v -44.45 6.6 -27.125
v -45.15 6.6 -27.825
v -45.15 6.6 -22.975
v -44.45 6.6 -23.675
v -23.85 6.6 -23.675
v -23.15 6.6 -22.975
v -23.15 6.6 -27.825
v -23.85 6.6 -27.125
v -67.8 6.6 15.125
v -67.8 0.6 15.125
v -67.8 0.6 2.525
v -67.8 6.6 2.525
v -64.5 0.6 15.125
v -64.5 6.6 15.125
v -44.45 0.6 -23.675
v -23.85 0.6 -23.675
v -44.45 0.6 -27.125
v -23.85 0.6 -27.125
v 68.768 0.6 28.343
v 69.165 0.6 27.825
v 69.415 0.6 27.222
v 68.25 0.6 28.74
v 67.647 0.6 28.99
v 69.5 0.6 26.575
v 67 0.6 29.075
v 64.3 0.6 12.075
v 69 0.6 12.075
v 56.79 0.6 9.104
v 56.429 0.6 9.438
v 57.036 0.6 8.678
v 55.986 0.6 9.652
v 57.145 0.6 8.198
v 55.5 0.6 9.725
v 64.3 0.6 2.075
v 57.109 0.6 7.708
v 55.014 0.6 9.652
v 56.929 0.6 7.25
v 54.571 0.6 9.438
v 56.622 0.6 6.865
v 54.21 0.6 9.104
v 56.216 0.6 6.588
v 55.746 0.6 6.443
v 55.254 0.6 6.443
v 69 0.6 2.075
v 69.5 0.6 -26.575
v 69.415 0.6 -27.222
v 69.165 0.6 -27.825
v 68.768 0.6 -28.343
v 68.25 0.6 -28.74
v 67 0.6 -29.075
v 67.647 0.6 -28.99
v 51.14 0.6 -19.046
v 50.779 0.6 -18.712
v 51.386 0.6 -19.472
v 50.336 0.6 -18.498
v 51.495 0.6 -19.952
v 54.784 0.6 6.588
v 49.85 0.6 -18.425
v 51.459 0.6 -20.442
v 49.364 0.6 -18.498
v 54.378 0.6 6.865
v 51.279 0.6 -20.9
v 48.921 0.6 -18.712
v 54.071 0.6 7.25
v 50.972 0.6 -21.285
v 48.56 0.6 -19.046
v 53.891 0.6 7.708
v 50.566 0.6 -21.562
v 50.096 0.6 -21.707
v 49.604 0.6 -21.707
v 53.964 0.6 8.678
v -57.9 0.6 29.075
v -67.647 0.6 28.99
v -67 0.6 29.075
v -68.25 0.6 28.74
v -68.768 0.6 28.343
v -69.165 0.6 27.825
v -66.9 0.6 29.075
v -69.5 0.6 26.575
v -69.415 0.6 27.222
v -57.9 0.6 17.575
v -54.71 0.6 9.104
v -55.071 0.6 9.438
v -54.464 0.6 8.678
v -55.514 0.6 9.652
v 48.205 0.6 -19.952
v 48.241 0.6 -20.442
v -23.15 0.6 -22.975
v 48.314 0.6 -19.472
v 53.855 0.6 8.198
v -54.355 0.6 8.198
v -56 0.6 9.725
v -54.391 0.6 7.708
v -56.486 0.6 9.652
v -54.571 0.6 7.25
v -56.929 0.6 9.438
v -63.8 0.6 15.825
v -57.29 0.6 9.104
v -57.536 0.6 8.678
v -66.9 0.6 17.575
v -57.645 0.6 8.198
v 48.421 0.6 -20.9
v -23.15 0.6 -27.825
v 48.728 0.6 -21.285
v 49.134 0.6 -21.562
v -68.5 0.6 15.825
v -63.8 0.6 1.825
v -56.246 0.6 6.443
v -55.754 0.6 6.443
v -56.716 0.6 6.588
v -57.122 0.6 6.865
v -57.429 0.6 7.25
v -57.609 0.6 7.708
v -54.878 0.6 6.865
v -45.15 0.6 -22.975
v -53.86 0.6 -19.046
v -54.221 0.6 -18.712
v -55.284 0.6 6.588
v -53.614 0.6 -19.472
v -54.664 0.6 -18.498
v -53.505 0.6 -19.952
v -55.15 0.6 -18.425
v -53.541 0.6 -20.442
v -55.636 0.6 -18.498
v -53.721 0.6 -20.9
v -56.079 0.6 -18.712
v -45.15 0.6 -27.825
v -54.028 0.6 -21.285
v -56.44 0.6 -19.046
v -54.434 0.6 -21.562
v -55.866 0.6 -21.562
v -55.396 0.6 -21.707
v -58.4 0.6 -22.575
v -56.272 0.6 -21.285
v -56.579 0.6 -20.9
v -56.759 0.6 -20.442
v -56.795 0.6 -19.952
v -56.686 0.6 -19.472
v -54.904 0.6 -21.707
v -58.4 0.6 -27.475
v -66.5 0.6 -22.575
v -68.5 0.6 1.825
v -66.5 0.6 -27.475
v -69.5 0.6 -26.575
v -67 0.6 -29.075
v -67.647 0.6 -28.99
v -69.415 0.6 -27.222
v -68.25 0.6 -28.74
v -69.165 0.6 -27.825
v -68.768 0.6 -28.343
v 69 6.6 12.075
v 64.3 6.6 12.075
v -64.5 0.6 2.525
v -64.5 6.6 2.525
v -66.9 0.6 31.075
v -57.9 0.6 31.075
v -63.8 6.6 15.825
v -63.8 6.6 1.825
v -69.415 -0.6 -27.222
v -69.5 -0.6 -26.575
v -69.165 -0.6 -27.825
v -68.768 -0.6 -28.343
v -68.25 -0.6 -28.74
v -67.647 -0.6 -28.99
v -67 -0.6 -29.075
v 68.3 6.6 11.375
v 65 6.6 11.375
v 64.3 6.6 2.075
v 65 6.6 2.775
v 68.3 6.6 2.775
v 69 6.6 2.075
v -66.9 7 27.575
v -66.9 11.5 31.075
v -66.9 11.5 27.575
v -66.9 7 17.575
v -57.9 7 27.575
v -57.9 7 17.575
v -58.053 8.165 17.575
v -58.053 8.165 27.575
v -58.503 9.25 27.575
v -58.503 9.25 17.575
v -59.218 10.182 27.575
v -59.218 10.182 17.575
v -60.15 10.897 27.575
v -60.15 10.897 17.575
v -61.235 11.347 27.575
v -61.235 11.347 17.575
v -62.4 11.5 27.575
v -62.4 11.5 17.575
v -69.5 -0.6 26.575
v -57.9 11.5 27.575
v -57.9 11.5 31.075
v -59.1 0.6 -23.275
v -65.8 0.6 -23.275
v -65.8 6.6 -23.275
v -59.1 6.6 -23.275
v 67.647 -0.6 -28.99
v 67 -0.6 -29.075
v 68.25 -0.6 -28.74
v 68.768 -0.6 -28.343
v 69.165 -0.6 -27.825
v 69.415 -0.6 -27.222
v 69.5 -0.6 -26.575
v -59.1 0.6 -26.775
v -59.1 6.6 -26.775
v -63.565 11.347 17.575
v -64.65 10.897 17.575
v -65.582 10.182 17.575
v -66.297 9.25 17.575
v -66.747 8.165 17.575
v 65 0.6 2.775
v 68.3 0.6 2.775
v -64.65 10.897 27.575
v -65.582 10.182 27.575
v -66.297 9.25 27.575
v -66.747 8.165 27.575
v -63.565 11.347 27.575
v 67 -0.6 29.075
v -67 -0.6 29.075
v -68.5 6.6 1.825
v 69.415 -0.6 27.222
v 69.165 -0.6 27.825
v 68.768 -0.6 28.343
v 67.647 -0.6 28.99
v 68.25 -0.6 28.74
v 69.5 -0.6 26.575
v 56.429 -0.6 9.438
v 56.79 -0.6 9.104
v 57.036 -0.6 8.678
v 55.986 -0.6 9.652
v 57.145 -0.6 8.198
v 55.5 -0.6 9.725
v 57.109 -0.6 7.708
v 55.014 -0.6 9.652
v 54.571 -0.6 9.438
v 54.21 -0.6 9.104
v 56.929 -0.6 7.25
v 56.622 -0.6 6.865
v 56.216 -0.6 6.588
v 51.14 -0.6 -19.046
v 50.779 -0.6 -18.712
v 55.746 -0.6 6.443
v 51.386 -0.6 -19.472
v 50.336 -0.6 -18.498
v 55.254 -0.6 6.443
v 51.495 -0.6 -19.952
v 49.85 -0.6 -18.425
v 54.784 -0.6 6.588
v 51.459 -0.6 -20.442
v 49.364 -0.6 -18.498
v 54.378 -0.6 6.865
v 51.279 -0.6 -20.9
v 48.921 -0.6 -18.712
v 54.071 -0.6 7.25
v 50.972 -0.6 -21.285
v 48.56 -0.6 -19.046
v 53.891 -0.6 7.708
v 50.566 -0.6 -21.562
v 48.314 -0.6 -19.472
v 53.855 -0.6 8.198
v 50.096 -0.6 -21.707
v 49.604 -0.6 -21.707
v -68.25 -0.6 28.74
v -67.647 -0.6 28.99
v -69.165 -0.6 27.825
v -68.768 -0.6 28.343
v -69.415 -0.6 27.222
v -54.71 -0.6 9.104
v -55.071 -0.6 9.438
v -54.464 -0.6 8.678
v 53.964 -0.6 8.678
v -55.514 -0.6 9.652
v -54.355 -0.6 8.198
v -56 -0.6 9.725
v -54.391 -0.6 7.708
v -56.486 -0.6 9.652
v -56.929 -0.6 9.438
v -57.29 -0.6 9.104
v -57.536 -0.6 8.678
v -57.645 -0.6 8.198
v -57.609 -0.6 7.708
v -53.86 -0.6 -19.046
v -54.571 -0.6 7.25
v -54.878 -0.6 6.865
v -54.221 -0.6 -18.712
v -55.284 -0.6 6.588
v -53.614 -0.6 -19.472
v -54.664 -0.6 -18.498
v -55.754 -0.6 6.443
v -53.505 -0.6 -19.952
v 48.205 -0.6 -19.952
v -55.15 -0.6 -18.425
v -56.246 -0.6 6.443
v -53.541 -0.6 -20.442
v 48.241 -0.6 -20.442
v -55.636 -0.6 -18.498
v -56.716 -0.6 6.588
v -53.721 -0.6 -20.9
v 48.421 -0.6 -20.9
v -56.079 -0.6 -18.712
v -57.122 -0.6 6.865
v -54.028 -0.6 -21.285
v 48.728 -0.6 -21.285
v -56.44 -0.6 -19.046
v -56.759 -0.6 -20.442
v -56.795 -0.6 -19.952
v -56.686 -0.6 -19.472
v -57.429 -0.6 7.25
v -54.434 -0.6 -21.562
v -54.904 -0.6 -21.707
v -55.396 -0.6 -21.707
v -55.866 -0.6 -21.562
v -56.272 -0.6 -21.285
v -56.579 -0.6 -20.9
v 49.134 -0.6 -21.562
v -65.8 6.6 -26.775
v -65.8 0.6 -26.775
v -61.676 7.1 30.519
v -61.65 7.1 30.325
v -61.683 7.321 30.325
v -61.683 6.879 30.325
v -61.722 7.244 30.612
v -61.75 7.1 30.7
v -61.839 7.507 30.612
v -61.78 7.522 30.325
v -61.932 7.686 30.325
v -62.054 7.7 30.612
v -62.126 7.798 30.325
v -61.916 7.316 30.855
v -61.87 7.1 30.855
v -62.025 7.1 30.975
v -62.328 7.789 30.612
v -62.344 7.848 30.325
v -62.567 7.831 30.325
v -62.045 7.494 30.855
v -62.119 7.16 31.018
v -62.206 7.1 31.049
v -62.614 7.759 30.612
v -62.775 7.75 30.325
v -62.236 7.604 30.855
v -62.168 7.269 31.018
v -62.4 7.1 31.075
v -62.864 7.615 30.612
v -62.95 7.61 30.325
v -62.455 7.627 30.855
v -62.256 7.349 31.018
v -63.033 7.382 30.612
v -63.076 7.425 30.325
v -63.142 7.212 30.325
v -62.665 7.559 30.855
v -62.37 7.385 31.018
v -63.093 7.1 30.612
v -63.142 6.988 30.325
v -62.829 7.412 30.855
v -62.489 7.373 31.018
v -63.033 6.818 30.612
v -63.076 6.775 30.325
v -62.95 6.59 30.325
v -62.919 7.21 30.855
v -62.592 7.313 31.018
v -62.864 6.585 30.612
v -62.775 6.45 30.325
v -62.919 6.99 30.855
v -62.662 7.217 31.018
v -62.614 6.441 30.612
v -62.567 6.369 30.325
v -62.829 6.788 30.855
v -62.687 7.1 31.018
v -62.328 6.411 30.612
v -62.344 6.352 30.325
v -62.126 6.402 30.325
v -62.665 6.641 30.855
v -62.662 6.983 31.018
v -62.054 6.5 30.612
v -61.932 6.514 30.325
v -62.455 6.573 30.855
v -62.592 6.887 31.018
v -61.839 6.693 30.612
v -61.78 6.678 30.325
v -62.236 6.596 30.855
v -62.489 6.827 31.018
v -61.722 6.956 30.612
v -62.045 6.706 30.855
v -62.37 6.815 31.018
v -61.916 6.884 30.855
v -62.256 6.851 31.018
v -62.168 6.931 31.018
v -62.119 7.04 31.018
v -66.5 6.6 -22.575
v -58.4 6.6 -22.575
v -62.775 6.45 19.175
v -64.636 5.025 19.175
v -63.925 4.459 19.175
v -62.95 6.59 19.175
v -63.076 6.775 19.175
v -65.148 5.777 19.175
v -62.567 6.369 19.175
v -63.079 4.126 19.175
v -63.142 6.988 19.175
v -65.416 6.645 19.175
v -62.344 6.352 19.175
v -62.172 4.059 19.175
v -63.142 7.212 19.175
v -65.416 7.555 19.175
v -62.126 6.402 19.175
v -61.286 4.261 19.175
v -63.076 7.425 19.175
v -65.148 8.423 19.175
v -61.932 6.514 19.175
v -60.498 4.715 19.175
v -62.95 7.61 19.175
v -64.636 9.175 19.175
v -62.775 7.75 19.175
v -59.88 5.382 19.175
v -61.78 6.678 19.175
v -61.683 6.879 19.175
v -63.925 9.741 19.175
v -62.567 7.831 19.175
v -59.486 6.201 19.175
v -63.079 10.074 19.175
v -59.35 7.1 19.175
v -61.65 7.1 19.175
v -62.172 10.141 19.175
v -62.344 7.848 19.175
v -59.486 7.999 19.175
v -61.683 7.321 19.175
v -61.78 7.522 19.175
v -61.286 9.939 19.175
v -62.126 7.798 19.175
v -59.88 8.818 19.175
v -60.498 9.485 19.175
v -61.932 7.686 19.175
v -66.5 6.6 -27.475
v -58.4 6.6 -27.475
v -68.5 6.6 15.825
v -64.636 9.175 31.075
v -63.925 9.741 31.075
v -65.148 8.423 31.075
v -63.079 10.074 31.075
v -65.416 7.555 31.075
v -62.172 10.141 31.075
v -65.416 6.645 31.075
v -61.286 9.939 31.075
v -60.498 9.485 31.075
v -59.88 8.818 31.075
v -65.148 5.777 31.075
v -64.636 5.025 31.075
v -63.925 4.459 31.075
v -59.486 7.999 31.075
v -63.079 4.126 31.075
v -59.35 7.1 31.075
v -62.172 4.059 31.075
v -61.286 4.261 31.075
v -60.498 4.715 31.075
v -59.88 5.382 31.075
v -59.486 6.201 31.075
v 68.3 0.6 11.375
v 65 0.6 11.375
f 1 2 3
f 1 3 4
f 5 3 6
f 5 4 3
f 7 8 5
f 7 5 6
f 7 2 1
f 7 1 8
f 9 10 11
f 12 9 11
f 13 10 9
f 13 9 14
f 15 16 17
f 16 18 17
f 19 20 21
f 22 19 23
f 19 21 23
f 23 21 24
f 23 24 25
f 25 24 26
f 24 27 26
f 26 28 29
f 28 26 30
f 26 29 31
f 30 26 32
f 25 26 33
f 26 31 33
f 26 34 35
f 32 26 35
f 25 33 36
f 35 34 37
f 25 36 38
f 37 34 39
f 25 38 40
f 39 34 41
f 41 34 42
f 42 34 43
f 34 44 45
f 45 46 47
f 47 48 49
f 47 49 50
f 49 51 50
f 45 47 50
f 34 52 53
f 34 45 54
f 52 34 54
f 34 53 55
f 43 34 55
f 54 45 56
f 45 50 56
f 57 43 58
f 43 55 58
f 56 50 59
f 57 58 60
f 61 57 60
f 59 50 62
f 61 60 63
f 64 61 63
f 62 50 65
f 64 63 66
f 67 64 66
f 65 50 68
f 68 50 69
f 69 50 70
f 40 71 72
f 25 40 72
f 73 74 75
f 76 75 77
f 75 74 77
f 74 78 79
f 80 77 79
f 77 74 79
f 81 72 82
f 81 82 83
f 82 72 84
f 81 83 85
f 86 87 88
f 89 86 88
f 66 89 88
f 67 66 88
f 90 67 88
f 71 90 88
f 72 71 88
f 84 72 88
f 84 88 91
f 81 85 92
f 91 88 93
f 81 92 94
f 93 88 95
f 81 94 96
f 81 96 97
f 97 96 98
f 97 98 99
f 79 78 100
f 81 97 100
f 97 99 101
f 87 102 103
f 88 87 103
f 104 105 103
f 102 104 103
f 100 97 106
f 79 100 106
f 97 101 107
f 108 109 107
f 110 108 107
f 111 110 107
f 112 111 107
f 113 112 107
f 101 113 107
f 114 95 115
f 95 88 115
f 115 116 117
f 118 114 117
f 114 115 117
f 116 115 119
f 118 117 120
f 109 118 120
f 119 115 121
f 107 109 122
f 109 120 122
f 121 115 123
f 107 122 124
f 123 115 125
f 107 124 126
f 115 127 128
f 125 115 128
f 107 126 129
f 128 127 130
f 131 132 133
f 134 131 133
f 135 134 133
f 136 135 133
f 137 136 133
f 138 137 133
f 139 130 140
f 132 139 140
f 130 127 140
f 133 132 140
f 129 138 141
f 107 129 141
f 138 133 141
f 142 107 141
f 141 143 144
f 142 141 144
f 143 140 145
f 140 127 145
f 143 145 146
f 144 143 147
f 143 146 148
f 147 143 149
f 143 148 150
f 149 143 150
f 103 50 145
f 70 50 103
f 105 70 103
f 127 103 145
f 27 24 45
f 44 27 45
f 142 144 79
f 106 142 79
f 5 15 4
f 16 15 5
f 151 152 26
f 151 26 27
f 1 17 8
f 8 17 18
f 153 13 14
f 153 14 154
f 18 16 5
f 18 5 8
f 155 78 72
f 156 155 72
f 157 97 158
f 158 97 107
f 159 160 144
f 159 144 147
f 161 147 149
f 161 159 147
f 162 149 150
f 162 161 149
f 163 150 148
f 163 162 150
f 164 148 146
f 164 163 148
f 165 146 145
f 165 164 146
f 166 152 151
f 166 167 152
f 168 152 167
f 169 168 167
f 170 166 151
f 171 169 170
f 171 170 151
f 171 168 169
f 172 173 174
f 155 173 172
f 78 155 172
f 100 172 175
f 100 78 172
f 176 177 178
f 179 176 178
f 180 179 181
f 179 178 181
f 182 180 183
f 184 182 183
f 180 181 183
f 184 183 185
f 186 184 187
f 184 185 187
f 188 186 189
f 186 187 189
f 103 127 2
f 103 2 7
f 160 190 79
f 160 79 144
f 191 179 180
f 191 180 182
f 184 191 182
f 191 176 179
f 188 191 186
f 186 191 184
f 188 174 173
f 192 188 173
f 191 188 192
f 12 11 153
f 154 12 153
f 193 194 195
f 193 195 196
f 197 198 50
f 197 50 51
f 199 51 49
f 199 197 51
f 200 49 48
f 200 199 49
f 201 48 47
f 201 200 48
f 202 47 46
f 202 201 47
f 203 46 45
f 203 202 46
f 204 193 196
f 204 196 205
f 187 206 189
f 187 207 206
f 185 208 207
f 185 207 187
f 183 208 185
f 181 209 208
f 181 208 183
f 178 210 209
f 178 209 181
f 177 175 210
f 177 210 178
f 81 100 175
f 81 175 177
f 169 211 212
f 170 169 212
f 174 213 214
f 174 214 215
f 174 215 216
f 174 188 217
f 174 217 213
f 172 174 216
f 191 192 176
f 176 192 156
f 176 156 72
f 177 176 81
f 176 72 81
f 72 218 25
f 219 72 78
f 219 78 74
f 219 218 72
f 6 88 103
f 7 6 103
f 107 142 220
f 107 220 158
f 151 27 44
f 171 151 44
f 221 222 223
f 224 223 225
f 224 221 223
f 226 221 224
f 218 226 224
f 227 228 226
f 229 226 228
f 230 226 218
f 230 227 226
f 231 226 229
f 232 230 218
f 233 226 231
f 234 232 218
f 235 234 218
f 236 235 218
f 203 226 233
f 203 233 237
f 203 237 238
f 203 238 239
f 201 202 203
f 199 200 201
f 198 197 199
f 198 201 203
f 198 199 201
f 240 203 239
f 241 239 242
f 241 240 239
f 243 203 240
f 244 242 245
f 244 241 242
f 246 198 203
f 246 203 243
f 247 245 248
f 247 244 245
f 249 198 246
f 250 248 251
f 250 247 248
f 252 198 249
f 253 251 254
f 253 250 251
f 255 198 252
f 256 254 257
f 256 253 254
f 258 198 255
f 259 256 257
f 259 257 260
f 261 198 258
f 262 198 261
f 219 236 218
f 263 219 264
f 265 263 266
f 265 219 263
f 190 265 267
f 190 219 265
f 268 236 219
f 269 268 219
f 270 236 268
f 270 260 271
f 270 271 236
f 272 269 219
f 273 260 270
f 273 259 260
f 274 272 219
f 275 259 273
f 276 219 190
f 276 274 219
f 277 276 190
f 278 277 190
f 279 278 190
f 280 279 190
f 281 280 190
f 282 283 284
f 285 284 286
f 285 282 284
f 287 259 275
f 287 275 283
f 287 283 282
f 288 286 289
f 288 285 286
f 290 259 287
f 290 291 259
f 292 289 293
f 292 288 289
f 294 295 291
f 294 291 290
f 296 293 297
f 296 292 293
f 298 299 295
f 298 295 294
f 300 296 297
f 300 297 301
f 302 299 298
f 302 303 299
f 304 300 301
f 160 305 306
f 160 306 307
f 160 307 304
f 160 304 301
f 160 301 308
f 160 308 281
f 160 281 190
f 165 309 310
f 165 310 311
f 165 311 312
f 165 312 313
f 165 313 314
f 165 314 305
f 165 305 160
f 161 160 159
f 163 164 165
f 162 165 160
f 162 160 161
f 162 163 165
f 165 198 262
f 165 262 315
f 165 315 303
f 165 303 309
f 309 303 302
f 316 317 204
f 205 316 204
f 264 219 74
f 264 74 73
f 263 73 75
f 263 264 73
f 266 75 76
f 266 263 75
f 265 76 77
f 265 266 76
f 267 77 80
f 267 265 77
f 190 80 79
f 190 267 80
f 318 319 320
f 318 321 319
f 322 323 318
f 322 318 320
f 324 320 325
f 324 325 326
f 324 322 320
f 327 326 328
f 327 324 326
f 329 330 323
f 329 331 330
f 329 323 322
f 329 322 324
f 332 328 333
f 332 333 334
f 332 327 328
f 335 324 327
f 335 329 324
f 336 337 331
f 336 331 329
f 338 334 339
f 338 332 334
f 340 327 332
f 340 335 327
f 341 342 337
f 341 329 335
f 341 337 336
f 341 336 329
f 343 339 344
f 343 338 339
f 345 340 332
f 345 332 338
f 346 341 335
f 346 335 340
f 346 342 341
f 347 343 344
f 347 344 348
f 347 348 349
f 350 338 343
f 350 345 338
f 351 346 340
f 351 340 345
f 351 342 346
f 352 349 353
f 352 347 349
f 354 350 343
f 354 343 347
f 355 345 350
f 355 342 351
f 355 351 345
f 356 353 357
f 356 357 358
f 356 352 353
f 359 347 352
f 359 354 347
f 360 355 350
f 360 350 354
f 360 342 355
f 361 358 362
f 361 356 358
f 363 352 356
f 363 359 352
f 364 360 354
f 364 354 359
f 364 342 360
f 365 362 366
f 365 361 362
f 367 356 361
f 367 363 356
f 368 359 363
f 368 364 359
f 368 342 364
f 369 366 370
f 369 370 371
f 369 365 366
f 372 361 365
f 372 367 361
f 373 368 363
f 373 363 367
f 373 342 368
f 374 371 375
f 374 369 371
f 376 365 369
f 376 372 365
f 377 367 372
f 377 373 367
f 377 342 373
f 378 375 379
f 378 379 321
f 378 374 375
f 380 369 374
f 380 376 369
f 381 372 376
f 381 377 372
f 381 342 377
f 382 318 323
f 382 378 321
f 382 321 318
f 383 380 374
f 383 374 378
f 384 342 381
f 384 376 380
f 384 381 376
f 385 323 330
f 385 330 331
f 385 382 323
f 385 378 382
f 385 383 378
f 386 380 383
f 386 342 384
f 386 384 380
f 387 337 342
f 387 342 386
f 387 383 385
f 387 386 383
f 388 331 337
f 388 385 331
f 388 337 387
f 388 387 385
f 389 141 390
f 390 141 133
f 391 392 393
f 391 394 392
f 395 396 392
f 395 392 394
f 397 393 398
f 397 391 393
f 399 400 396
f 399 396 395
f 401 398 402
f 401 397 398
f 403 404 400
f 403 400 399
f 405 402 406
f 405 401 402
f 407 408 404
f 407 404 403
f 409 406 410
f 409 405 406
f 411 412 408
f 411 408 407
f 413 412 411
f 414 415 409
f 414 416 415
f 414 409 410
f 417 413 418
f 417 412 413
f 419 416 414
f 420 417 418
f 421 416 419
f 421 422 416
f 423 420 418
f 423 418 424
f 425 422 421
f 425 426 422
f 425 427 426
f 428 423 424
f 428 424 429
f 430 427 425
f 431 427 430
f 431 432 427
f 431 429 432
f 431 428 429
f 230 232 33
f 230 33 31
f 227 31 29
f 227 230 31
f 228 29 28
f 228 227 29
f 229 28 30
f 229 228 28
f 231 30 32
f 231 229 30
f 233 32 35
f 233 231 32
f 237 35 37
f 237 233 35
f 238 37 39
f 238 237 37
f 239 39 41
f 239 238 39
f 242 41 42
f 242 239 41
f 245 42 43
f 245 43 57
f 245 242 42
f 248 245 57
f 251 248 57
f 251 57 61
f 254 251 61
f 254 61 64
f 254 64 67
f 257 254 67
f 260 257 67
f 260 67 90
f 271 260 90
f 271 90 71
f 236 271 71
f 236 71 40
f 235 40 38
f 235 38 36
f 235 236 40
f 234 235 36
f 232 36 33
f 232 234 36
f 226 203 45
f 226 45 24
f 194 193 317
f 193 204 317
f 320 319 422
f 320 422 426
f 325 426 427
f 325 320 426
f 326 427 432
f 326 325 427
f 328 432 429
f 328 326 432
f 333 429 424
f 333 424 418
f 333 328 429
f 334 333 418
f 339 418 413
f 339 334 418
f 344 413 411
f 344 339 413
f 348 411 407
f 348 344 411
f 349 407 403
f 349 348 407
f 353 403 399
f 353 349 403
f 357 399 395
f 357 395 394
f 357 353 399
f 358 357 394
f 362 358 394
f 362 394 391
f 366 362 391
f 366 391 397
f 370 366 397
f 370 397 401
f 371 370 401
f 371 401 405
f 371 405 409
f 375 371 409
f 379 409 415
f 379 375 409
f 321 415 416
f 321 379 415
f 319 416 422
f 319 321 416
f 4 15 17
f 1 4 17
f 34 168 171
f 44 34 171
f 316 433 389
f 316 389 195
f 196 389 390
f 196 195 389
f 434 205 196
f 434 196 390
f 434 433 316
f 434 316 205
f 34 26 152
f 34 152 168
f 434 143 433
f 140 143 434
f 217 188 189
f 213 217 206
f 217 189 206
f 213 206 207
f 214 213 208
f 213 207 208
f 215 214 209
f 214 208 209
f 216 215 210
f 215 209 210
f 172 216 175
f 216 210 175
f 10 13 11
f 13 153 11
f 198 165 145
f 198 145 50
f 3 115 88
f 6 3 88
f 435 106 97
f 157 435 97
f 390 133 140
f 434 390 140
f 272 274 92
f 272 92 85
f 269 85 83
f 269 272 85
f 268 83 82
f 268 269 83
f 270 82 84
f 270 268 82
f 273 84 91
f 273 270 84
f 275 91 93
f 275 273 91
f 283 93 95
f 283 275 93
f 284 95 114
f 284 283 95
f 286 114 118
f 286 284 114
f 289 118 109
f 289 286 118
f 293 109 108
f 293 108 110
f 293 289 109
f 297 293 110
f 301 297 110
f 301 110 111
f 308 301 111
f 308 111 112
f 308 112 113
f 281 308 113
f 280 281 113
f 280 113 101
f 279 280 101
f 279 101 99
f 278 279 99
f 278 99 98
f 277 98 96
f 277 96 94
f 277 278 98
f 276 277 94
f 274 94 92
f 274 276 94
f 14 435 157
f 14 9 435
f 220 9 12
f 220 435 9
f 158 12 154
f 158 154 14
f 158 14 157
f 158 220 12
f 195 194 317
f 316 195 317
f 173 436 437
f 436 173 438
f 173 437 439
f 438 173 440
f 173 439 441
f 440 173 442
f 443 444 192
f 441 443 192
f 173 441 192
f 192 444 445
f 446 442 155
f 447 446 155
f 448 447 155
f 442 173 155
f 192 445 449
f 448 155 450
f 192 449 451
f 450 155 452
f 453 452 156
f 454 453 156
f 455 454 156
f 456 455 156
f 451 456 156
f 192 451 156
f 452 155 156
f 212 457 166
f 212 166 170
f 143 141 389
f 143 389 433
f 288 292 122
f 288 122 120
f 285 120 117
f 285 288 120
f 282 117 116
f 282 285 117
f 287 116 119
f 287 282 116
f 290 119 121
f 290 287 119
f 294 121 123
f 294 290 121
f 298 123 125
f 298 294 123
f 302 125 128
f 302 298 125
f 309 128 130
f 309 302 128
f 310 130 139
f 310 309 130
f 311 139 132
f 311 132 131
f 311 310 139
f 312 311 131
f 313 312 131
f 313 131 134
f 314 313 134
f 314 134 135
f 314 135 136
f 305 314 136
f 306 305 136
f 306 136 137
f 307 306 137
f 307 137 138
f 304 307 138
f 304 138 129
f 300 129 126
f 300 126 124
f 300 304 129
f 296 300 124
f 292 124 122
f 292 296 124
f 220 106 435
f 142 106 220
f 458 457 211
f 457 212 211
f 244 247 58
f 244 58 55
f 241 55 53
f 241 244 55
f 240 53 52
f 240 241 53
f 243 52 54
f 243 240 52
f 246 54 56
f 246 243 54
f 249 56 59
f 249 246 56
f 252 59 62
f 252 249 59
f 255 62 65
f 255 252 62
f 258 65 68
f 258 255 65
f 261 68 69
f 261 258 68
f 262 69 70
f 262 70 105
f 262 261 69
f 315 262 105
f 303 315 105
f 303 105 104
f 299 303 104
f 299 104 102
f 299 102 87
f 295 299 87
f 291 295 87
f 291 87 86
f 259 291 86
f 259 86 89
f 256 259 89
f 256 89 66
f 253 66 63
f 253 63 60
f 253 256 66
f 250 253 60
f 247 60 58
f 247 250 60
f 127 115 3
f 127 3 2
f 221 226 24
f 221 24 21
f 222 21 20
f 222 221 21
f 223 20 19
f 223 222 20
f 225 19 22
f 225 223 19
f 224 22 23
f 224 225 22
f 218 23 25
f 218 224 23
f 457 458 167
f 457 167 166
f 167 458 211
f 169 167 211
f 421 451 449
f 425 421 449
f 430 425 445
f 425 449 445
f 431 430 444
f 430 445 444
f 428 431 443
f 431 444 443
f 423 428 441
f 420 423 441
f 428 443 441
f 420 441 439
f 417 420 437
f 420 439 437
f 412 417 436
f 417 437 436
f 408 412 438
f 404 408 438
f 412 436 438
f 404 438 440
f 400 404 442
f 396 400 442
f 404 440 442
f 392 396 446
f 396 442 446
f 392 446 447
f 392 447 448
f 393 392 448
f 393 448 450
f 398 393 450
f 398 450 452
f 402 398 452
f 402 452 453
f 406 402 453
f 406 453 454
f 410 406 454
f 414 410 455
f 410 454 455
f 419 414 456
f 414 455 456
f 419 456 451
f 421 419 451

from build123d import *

# Parameters (mm, degrees)
BOSS_EXTRUDE1_DEPTH      = 0.6
BOSS_EXTRUDE1_DEPTH_BACK = 0.6
SKETCH1_R                = 1.65
SKETCH2_W                = 8.1
SKETCH2_H                = 4.9
SKETCH2_W_2              = 6.7
SKETCH2_H_2              = 3.5
SKETCH2_W_3              = 22
SKETCH2_H_3              = 4.85
SKETCH2_W_4              = 20.6
SKETCH2_H_4              = 3.45
SKETCH2_W_5              = 4.7
SKETCH2_H_5              = 14
SKETCH2_W_6              = 3.3
SKETCH2_H_6              = 12.6
SKETCH2_H_7              = 10
SKETCH2_H_8              = 8.6
BOSS_EXTRUDE2_DEPTH      = 6
SKETCH3_W                = 9
SKETCH3_H                = 13.5
BOSS_EXTRUDE3_DEPTH      = 10.9
CUT_EXTRUDE1_DEPTH       = 10
SKETCH5_R                = 3.05
SKETCH5_R_2              = 0.75
CUT_EXTRUDE2_DEPTH       = 11.9
FILLET1_R                = 0.75


with BuildPart() as part:
    # Sketch1 → Boss-Extrude1 (new, two sides: drawn at the far end of the back side and taken through both)
    with BuildSketch(Plane(origin=(0, 0, 0), x_dir=(1, 0, 0), z_dir=(0, 1, 0)).offset(-BOSS_EXTRUDE1_DEPTH_BACK)):
        with BuildLine():
            Line((-67, 29.075), (67, 29.075))
            ThreePointArc((67, 29.075), (68.767766953, 28.342766953), (69.5, 26.575))
            Line((69.5, 26.575), (69.5, -26.575))
            ThreePointArc((69.5, -26.575), (68.767766953, -28.342766953), (67, -29.075))
            Line((67, -29.075), (-67, -29.075))
            ThreePointArc((-67, -29.075), (-68.767766953, -28.342766953), (-69.5, -26.575))
            Line((-69.5, -26.575), (-69.5, 26.575))
            ThreePointArc((-69.5, 26.575), (-68.767766953, 28.342766953), (-67, 29.075))
        make_face()
        with Locations((-55.15, 20.075)):
            Circle(SKETCH1_R, mode=Mode.SUBTRACT)
        with Locations((49.85, 20.075)):
            Circle(SKETCH1_R, mode=Mode.SUBTRACT)
        with Locations((55.5, -8.075)):
            Circle(SKETCH1_R, mode=Mode.SUBTRACT)
        with Locations((-56, -8.075)):
            Circle(SKETCH1_R, mode=Mode.SUBTRACT)
    extrude(amount=BOSS_EXTRUDE1_DEPTH + BOSS_EXTRUDE1_DEPTH_BACK)

    # Sketch2 → Boss-Extrude2 (add)
    # profile 1 of 4: a face of its own
    with BuildSketch(Plane(origin=(0, 0.6, 0), x_dir=(1, 0, 0), z_dir=(0, 1, 0))):
        with Locations((-62.45, 25.025)):
            Rectangle(SKETCH2_W, SKETCH2_H)
        with Locations((-62.45, 25.025)):
            Rectangle(SKETCH2_W_2, SKETCH2_H_2, mode=Mode.SUBTRACT)
    # profile 2 of 4: a face of its own
    with BuildSketch(Plane(origin=(0, 0.6, 0), x_dir=(1, 0, 0), z_dir=(0, 1, 0))):
        with Locations((-34.15, 25.4)):
            Rectangle(SKETCH2_W_3, SKETCH2_H_3)
        with Locations((-34.15, 25.4)):
            Rectangle(SKETCH2_W_4, SKETCH2_H_4, mode=Mode.SUBTRACT)
    # profile 3 of 4: a face of its own
    with BuildSketch(Plane(origin=(0, 0.6, 0), x_dir=(1, 0, 0), z_dir=(0, 1, 0))):
        with Locations((-66.15, -8.825)):
            Rectangle(SKETCH2_W_5, SKETCH2_H_5)
        with Locations((-66.15, -8.825)):
            Rectangle(SKETCH2_W_6, SKETCH2_H_6, mode=Mode.SUBTRACT)
    # profile 4 of 4: a face of its own
    with BuildSketch(Plane(origin=(0, 0.6, 0), x_dir=(1, 0, 0), z_dir=(0, 1, 0))):
        with Locations((66.65, -7.075)):
            Rectangle(SKETCH2_W_5, SKETCH2_H_7)
        with Locations((66.65, -7.075)):
            Rectangle(SKETCH2_W_6, SKETCH2_H_8, mode=Mode.SUBTRACT)
    extrude(amount=BOSS_EXTRUDE2_DEPTH)

    # Sketch3 → Boss-Extrude3 (add)
    with BuildSketch(Plane(origin=(0, 0.6, 0), x_dir=(1, 0, 0), z_dir=(0, 1, 0))):
        with Locations((-62.4, -24.325)):
            Rectangle(SKETCH3_W, SKETCH3_H)
    extrude(amount=BOSS_EXTRUDE3_DEPTH)

    # Sketch4 → Cut-Extrude1 (cut)
    with BuildSketch(Plane(origin=(0, 0, 17.575), x_dir=(-1, 0, 0), z_dir=(0, 0, -1))):
        with BuildLine():
            Line((66.9, 11.5), (62.4, 11.5))
            ThreePointArc((62.4, 11.5), (65.581980515, 10.181980515), (66.9, 7))
            Line((66.9, 7), (66.9, 11.5))
        make_face()
        with BuildLine():
            Line((57.9, 11.5), (57.9, 7))
            ThreePointArc((57.9, 7), (59.218019485, 10.181980515), (62.4, 11.5))
            Line((62.4, 11.5), (57.9, 11.5))
        make_face()
    extrude(amount=-CUT_EXTRUDE1_DEPTH, mode=Mode.SUBTRACT)

    # Sketch5 → Cut-Extrude2 (cut)
    with BuildSketch(Plane.XY.offset(31.075)):
        with Locations((-62.4, 7.1)):
            Circle(SKETCH5_R)
        with Locations((-62.4, 7.1)):
            Circle(SKETCH5_R_2, mode=Mode.SUBTRACT)
    extrude(amount=-CUT_EXTRUDE2_DEPTH, mode=Mode.SUBTRACT)

    # Fillet1
    fillet1_edges = [part.edges().sort_by_distance(p)[0] for p in [
        (-63.15, 7.1, 31.075),
    ]]
    fillet(fillet1_edges, radius=FILLET1_R)


solid = part.part
